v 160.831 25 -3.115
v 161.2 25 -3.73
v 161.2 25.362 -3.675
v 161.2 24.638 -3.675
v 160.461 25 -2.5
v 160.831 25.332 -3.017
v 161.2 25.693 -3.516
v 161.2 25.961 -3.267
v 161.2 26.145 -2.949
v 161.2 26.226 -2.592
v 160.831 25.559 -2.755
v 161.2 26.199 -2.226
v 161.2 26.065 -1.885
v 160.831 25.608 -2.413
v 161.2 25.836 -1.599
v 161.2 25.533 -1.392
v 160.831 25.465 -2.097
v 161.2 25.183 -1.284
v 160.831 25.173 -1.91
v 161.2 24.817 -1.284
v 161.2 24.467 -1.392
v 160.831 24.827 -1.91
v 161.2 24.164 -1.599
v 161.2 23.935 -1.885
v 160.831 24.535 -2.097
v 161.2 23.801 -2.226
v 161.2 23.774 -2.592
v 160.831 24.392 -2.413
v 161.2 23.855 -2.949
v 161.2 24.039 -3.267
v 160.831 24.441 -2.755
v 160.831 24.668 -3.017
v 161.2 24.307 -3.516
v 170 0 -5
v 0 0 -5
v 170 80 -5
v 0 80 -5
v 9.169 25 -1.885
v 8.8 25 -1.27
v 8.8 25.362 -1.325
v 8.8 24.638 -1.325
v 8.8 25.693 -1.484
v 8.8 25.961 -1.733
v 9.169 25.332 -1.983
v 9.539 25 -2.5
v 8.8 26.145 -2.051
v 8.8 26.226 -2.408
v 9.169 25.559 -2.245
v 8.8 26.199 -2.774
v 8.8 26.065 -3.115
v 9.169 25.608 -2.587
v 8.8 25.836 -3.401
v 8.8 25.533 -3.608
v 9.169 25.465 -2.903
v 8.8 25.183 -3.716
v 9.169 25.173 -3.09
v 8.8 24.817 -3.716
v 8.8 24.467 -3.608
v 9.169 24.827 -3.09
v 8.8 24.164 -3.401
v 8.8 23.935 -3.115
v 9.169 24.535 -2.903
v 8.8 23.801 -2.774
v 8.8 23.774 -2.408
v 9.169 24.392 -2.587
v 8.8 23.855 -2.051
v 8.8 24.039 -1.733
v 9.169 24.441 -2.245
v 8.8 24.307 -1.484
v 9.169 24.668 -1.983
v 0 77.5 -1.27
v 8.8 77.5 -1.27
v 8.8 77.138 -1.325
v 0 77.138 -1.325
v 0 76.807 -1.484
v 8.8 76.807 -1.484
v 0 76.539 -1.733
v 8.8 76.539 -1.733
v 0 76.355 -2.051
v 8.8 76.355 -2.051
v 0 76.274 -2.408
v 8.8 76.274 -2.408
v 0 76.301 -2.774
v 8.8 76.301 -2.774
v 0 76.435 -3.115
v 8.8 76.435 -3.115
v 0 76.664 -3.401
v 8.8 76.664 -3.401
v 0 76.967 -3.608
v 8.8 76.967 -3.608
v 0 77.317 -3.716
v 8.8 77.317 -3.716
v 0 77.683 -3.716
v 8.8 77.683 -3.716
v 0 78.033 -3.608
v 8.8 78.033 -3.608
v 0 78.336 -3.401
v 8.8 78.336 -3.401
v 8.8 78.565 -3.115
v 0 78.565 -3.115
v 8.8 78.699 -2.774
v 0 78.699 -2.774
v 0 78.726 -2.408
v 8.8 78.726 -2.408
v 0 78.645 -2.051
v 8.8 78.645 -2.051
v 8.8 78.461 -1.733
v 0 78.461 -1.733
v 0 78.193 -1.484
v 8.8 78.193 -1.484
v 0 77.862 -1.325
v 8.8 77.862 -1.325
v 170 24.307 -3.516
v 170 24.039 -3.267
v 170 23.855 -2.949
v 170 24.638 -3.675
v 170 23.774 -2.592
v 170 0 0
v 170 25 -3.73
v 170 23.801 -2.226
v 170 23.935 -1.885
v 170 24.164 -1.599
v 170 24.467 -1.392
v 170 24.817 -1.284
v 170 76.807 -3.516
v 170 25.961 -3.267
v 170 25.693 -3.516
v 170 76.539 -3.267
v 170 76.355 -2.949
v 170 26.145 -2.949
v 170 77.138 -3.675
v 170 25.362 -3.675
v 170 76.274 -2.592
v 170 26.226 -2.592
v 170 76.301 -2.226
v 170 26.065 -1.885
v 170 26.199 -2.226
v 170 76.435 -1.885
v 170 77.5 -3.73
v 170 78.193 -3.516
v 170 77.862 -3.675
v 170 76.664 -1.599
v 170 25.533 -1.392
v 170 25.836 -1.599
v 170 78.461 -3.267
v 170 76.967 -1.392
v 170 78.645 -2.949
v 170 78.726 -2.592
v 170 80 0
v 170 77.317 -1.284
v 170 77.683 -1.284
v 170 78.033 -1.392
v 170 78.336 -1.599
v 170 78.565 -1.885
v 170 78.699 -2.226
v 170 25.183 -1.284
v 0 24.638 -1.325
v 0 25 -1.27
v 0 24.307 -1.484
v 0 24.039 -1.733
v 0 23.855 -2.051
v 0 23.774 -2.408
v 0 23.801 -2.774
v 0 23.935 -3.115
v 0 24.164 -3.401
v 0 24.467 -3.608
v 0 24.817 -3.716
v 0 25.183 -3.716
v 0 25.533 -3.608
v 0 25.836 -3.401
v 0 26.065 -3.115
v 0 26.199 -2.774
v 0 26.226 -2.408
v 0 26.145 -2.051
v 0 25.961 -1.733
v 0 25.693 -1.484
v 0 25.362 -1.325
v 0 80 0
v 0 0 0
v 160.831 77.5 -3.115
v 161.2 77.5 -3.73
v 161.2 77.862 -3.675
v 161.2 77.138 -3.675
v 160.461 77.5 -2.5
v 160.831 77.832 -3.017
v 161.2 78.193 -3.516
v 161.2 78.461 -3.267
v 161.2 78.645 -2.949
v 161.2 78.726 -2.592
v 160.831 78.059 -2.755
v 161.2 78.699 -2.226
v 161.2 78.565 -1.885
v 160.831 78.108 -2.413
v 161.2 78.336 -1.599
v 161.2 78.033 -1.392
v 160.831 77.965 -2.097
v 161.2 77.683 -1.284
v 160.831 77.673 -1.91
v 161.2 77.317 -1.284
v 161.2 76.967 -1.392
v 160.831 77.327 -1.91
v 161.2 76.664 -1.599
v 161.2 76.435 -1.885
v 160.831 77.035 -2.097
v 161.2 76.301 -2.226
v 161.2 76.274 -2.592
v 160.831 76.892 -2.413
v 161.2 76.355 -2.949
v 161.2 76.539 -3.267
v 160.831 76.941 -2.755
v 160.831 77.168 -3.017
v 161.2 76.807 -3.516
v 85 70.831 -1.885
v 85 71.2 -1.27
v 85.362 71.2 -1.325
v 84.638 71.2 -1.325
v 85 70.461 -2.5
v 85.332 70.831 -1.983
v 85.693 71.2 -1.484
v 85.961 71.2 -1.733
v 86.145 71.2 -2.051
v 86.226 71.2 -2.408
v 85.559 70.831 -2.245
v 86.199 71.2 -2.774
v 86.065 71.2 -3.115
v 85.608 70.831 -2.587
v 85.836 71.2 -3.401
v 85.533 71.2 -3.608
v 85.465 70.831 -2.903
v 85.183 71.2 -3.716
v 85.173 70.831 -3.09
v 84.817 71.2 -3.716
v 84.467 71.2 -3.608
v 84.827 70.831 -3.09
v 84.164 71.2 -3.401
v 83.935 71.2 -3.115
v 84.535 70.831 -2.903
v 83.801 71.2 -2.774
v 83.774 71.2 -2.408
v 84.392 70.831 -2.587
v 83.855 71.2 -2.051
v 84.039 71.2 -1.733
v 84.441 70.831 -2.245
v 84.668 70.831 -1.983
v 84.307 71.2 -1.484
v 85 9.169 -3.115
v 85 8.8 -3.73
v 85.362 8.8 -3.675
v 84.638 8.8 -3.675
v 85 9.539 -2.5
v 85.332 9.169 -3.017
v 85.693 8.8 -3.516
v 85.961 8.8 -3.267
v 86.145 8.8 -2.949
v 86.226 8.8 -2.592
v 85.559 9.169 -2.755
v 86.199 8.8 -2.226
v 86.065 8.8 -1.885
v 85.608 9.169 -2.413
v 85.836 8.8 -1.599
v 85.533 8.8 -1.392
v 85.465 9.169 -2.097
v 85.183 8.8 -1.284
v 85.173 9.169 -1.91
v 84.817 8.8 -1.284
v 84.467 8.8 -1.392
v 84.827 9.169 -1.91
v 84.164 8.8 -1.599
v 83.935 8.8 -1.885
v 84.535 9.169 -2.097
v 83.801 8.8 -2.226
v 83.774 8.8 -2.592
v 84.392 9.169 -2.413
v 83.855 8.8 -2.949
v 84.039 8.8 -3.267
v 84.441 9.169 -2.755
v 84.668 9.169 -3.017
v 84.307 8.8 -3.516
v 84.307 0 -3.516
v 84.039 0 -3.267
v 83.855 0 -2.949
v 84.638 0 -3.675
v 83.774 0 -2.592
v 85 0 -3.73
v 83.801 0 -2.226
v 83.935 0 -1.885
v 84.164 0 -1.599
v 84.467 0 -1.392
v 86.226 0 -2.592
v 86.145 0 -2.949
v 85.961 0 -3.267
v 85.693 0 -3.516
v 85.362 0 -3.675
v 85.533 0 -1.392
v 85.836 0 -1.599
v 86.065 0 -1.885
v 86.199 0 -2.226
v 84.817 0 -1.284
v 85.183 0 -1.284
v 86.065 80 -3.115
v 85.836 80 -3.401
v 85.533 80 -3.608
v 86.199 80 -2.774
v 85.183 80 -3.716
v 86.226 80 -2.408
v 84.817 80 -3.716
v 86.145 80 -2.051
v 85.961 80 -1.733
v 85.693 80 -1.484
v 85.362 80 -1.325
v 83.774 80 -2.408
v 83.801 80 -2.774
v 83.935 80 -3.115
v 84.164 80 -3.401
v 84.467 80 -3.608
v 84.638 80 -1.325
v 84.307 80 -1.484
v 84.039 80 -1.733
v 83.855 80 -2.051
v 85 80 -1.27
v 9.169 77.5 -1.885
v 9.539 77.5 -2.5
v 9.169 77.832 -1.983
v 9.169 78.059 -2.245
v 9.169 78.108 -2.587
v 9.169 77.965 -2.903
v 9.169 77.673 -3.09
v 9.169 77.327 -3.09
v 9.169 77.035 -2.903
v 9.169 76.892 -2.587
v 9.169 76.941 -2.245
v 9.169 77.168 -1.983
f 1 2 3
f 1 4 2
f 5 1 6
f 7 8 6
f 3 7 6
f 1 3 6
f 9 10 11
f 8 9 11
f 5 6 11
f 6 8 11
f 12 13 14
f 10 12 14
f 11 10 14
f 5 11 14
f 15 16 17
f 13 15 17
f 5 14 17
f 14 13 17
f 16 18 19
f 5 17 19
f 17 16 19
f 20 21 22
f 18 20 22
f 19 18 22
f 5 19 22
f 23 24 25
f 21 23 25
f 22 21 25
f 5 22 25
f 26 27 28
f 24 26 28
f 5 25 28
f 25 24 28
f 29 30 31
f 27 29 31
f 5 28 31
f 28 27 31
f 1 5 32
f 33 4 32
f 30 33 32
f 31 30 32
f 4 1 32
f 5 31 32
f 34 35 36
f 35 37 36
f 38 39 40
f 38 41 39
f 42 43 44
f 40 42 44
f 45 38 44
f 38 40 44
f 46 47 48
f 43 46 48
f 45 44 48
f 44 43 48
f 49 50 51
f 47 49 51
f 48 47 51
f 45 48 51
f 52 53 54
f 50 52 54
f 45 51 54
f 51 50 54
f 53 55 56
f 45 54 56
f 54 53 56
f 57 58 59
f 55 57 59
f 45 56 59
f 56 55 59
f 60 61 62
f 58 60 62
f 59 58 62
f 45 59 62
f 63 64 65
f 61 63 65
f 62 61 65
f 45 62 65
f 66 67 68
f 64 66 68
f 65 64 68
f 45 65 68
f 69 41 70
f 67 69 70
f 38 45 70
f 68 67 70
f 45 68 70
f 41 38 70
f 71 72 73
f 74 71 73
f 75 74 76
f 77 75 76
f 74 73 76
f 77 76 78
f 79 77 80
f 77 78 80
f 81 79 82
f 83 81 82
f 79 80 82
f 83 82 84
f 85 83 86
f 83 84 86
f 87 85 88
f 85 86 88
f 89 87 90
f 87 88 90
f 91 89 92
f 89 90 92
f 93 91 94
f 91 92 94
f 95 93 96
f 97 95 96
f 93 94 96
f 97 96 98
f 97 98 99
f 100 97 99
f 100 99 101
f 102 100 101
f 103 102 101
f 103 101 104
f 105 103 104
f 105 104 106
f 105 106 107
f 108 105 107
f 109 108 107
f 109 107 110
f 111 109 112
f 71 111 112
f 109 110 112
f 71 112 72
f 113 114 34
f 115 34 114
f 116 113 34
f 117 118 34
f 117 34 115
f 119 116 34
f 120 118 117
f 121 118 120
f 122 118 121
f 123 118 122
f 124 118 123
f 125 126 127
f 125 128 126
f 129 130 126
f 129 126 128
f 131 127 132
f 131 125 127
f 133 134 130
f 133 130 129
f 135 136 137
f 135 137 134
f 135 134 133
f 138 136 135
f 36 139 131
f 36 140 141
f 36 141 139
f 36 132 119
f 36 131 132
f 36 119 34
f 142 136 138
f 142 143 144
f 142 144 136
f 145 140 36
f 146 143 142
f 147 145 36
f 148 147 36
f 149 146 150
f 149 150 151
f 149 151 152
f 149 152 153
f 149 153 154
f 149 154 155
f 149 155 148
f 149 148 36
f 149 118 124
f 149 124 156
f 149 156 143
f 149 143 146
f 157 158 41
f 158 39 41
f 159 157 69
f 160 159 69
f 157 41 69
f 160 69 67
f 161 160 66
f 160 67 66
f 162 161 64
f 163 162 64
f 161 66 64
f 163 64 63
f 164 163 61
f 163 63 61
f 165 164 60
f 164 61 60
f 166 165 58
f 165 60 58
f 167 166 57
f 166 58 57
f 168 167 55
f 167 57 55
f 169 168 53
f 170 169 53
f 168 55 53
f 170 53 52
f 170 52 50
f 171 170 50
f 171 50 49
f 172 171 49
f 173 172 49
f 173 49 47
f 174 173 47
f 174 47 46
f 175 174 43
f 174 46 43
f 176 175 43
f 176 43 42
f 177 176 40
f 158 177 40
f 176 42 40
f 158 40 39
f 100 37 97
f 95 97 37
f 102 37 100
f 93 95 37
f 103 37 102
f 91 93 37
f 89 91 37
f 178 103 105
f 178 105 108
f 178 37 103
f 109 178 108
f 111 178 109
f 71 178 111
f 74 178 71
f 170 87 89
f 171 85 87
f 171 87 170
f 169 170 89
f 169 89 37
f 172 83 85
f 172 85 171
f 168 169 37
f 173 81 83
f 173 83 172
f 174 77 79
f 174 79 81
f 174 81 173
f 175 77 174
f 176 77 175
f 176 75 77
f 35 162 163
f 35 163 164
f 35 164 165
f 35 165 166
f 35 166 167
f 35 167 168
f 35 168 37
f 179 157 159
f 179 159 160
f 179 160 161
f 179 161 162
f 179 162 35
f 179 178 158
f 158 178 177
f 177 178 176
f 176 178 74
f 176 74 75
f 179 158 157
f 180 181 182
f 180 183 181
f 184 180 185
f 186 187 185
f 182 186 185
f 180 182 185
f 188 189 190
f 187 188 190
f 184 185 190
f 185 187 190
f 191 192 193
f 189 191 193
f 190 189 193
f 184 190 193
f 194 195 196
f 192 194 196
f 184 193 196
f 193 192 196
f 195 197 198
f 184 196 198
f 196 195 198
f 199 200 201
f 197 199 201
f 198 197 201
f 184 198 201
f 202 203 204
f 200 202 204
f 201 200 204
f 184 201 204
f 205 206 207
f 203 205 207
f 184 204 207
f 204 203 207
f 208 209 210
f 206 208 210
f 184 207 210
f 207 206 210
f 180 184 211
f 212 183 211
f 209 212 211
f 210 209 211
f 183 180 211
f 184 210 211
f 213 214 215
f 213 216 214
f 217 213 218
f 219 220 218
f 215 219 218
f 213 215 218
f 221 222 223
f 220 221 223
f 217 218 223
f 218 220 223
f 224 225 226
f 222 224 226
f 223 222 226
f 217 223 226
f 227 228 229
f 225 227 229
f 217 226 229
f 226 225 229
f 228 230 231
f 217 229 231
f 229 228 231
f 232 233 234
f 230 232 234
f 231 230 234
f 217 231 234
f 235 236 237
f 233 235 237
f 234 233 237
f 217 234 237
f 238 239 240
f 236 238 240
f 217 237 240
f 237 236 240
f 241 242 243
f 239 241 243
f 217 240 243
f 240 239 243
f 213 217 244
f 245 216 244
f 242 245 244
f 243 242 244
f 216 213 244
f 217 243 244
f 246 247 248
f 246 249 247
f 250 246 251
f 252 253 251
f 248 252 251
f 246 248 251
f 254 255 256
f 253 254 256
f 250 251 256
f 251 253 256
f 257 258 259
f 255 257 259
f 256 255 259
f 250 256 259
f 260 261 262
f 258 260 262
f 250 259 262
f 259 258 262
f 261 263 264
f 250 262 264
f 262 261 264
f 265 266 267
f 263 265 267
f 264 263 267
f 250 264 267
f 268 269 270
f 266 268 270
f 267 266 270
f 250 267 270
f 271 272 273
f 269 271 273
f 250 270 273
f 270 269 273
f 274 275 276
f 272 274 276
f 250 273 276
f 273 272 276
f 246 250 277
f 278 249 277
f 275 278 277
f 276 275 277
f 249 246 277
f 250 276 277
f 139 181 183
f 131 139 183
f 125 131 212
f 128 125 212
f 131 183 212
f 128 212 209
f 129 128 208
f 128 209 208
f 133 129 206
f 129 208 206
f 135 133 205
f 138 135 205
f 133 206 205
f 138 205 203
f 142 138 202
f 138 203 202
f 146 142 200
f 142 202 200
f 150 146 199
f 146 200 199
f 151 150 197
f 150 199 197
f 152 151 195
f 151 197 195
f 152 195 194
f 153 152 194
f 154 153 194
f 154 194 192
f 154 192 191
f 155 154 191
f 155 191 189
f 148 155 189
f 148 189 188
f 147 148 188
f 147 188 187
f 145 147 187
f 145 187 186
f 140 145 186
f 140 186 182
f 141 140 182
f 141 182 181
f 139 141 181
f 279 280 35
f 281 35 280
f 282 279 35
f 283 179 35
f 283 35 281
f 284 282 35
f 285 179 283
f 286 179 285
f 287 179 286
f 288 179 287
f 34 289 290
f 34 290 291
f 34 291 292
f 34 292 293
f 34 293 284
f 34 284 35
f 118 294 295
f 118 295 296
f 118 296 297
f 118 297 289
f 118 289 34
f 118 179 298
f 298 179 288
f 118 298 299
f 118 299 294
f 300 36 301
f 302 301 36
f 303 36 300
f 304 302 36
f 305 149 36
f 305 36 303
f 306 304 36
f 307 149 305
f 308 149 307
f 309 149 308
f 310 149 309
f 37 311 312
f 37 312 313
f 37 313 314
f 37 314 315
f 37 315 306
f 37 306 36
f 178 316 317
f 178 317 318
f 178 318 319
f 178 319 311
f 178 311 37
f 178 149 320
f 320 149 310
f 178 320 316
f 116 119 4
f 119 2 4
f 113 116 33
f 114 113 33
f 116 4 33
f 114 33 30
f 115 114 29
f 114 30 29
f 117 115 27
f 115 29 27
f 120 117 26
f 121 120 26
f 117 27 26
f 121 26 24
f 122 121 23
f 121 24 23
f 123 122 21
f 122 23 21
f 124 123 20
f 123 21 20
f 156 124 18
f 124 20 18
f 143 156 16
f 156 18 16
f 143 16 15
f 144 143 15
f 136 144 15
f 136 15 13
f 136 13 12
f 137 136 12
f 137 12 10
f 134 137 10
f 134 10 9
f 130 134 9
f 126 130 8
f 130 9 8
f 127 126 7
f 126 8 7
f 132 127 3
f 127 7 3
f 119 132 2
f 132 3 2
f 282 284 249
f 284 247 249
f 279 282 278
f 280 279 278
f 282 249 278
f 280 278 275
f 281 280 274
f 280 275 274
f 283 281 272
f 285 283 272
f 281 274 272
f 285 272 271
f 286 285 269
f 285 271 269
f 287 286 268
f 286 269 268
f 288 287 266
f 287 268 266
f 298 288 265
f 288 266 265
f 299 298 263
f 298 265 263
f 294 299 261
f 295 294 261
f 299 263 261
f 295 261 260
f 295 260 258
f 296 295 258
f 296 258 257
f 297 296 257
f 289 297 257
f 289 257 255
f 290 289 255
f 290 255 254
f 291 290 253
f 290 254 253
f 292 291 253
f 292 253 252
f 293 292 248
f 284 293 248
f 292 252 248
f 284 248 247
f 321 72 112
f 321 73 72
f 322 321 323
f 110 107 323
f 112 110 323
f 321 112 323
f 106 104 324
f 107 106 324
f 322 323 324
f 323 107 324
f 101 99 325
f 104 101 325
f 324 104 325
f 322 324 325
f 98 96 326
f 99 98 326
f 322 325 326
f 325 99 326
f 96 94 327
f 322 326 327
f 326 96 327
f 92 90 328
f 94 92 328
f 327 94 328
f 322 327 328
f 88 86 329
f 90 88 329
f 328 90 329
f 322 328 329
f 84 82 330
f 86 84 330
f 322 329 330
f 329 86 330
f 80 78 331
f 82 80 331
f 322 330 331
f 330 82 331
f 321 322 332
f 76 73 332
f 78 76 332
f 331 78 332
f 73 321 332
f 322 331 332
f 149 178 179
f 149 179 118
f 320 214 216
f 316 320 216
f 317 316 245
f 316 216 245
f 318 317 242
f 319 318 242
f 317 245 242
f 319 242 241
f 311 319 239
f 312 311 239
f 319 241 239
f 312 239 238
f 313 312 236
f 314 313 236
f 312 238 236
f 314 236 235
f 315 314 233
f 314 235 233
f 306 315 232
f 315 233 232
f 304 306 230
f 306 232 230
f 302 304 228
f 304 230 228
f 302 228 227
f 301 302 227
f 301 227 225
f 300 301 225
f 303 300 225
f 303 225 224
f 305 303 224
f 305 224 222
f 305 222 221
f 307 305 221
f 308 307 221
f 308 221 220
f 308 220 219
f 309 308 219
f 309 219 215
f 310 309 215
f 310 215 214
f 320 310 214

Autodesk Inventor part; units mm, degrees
ref_plane "YZ Plane" through (0, 0, 0) normal (1, 0, 0) x (0, 1, 0)
ref_plane "XZ Plane" through (0, 0, 0) normal (0, 1, 0) x (-1, 0, 0)
ref_plane "XY Plane" through (0, 0, 0) normal (0, 0, 1) x (1, 0, 0)
sketch "Esquisse1" plane through (0, 0, 0) normal (0, 0, 1) x (1, 0, 0)
  line L0 (0, 0) -> (170, 0)
  line L1 (170, 0) -> (170, 80)
  line L2 (170, 80) -> (0, 80)
  line L3 (0, 80) -> (0, 0)
  dimension "d0" = 170
  dimension "d1" = 80
extrude "Extrusion1" add sketch "Esquisse1" against normal blind 5
sketch "Esquisse3" plane through (170, 0, 0) normal (1, 0, 0) x (0, 0, -1)
  line L0 (0, 0) -> (0, 80) projected
  line L1 (0, 80) -> (0, 77.5)
  line L2 (0, 77.5) -> (2.5, 77.5)
  line L3 (0, 77.5) -> (2.5, 77.5) construction
  line L4 (0, 0) -> (2.5, 0)
  line L5 (2.5, 0) -> (2.5, 25)
  dimension "d4" = 2.5
  dimension "d5" = 2.5
  dimension "d6" = 0
  dimension "d14" = 25
hole "Perçage1" at (170, 77.5, -2.5) at (170, 25, -2.5) direction (-1, 0, 0) diameter 2.459 depth 8.8 tip angle 118 thread size "M3x0.5" class "6H" standard "ISO Metric profile"
sketch "Esquisse4" plane through (0, 0, 0) normal (-1, 0, 0) x (0, 0, 1)
  line L0 (0, 0) -> (-2.5, 0)
  line L1 (0, 0) -> (-5, 0) projected
  line L2 (-2.5, 0) -> (-2.5, 25)
  line L3 (0, 0) -> (0, 80) projected
  line L4 (0, 80) -> (-2.5, 80)
  line L5 (-2.5, 80) -> (-2.5, 77.5)
  dimension "d15" = 2.5
  dimension "d16" = 25
  dimension "d17" = 2.5
  dimension "d18" = 90
hole "Perçage2" at (0, 25, -2.5) at (0, 77.5, -2.5) direction (1, 0, 0) diameter 2.459 depth 8.8 tip angle 118 thread size "M3x0.5" class "6H" standard "ISO Metric profile"
sketch "Esquisse5" plane through (0, 80, 0) normal (0, 1, 0) x (1, 0, 0)
  line L0 (170, 0) -> (0, 0) projected
  line L1 (170, 5) -> (0, 5) projected
  point P0 (85, 2.5)
hole "Perçage3" at (85, 80, -2.5) direction (0, -1, 0) diameter 2.459 depth 8.8 tip angle 118 thread size "M3x0.5" class "6H" standard "ISO Metric profile"
sketch "Esquisse6" plane through (0, 0, 0) normal (0, -1, 0) x (1, 0, 0)
  line L0 (0, 0) -> (170, 0) projected
  line L1 (0, -5) -> (170, -5) projected
  point P0 (85, -2.5)
hole "Perçage4" at (85, 0, -2.5) direction (0, 1, 0) diameter 2.459 depth 8.8 tip angle 118 thread size "M3x0.5" class "6H" standard "ISO Metric profile"
properties part number "chassis_face_arriere"
